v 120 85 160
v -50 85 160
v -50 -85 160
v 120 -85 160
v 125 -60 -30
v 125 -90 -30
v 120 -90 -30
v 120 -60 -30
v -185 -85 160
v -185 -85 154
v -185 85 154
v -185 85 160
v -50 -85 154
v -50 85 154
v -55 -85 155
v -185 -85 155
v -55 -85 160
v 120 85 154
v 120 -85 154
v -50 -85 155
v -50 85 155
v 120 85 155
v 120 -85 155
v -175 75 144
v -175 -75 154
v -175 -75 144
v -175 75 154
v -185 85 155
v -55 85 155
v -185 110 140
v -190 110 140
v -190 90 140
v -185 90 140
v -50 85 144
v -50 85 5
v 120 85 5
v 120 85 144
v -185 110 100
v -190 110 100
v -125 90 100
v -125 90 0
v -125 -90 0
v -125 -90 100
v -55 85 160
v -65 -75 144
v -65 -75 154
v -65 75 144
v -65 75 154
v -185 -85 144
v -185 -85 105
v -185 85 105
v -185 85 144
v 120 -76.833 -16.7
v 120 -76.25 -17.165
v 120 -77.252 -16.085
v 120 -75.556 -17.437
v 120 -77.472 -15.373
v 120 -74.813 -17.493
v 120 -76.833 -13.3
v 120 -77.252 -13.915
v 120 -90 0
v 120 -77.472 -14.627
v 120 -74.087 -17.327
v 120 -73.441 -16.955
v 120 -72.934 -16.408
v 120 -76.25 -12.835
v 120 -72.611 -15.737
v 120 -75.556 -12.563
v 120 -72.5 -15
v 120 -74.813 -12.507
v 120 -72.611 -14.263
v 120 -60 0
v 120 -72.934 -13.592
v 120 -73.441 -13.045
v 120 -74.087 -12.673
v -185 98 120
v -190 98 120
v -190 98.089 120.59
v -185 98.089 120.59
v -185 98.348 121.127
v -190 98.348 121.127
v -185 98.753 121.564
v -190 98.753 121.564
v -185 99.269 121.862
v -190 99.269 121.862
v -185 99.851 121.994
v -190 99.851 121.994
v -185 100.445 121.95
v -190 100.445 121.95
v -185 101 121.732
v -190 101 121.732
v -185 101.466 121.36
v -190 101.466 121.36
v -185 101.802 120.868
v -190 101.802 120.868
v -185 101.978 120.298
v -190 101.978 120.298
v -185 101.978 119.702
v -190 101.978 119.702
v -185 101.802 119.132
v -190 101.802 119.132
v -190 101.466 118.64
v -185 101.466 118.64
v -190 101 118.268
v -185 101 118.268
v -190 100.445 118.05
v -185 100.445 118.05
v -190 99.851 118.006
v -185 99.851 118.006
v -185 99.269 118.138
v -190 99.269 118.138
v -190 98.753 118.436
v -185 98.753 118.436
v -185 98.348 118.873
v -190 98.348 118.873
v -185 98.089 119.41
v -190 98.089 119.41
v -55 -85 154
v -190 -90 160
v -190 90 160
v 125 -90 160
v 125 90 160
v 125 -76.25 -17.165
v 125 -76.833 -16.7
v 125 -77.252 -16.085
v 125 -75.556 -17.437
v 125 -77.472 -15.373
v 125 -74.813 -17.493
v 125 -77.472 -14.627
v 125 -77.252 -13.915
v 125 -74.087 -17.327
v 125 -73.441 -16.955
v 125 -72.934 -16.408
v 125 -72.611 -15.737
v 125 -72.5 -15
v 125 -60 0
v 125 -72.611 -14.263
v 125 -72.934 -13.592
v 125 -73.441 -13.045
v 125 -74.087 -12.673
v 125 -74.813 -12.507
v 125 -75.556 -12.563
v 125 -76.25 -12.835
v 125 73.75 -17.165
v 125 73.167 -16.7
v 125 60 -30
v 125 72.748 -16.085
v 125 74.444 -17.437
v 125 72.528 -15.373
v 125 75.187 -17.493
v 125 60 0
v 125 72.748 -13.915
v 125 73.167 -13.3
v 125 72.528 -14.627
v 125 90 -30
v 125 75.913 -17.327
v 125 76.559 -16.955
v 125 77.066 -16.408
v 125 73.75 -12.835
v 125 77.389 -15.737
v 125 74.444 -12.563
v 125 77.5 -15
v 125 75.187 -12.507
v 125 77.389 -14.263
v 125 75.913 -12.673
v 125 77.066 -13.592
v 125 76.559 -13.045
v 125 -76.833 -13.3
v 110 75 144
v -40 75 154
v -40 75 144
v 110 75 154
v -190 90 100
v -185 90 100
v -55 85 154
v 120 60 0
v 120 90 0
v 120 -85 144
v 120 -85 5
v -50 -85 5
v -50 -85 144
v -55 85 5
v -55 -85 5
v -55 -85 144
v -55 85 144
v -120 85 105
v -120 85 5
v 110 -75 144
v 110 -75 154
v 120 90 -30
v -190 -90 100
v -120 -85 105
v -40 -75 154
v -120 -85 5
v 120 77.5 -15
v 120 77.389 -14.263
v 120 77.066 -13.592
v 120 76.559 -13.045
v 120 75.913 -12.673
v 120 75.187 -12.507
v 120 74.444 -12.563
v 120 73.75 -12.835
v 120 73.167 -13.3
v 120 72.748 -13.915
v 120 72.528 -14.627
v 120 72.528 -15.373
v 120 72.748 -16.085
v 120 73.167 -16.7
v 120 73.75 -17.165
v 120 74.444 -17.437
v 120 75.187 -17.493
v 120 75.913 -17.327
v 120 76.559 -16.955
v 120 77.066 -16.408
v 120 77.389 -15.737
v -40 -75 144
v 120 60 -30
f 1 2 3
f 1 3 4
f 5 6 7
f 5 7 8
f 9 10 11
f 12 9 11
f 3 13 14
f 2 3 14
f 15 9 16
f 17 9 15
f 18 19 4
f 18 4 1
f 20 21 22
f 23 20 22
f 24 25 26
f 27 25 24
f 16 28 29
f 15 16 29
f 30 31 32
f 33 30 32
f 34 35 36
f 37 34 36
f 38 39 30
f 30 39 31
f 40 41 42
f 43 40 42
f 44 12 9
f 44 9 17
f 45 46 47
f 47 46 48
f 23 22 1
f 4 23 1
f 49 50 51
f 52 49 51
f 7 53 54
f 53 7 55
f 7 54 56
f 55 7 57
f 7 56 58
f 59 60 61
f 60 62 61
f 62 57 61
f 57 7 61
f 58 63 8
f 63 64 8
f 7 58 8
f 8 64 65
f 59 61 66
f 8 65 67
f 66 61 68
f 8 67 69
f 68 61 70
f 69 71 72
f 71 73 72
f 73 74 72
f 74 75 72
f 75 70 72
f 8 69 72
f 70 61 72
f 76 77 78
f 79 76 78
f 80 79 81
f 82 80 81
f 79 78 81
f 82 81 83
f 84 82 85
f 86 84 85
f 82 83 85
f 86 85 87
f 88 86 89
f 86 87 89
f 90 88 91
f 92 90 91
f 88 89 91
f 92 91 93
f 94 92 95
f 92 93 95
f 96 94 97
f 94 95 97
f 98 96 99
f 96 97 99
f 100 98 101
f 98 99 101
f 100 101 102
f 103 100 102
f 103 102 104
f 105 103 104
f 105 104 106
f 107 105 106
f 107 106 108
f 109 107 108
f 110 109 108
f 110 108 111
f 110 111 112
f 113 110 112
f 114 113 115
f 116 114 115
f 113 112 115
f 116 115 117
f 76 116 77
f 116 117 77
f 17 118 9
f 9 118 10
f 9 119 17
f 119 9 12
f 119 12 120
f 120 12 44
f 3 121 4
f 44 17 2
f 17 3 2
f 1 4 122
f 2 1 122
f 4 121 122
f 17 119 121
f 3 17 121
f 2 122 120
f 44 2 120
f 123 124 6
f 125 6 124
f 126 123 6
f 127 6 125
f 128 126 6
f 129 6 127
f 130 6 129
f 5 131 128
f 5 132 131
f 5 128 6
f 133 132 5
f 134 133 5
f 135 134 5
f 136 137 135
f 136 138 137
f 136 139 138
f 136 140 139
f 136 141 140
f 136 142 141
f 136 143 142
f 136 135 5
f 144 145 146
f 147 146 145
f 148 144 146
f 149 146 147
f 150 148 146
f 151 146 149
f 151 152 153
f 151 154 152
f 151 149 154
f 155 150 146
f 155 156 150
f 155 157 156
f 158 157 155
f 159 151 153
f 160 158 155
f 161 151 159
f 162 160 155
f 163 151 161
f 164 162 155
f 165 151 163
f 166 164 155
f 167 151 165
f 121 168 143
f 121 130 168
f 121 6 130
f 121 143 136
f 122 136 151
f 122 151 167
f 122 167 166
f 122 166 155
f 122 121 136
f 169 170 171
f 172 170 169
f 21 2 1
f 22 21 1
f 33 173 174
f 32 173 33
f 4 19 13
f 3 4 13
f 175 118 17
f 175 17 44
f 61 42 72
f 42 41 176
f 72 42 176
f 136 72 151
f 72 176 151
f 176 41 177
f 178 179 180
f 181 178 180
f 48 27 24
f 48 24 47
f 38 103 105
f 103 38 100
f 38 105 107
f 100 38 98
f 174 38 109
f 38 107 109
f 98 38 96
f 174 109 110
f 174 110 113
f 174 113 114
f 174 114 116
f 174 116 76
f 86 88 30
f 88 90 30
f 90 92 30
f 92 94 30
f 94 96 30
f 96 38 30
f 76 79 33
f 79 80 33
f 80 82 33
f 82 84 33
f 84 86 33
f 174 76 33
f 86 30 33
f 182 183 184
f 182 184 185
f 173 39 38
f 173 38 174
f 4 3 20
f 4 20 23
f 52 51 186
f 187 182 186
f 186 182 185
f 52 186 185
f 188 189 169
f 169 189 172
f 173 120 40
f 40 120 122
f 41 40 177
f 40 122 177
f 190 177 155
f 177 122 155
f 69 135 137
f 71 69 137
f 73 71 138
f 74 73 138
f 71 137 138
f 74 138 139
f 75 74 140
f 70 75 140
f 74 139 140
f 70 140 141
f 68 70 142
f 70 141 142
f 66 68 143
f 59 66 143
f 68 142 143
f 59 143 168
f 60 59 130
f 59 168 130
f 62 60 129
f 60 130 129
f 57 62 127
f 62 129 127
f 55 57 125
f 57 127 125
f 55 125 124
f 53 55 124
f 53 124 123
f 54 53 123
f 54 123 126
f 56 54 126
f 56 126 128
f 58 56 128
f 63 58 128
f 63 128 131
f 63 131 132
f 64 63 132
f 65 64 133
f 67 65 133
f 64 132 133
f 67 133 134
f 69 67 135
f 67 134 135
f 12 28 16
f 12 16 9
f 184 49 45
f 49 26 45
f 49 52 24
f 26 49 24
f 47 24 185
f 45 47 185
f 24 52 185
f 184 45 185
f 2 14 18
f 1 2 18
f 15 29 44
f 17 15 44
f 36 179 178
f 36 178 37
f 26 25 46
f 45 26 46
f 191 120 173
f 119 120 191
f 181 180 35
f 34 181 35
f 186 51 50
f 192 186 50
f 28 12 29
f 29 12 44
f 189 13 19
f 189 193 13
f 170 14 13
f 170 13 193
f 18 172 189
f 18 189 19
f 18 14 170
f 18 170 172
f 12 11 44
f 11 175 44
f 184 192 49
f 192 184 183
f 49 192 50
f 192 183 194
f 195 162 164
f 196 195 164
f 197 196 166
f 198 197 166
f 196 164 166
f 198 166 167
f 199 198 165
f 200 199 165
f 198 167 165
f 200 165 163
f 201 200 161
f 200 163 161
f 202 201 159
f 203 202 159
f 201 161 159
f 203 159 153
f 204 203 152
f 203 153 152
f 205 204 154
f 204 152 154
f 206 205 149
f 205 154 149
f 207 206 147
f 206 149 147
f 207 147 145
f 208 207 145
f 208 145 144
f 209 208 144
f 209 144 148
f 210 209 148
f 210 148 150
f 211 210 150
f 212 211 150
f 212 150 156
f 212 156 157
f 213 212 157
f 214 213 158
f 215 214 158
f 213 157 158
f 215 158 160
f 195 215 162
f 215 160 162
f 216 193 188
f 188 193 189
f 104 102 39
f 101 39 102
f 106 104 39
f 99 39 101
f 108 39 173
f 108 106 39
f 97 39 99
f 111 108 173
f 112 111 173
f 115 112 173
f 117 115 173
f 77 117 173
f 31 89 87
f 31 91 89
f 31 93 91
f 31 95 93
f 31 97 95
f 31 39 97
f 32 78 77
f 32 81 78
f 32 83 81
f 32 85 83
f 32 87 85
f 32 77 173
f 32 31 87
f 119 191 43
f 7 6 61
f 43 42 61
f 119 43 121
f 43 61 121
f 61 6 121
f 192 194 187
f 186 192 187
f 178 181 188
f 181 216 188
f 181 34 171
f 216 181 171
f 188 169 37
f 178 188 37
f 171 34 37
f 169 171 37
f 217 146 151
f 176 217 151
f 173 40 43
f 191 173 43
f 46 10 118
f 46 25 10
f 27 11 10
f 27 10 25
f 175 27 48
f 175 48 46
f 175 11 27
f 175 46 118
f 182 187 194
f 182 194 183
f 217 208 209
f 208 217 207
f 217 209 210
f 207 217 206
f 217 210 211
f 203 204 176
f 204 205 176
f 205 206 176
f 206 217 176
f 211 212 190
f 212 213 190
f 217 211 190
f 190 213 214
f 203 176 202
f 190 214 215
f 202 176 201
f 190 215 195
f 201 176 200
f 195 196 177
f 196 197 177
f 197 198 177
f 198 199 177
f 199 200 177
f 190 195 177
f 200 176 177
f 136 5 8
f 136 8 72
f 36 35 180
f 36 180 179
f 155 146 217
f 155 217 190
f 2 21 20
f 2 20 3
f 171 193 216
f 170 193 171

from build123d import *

# Parameters (mm, degrees)
F0_W      = 5
F0_H      = 5
F0_H_2    = 170
F1_DEPTH  = 160
F0_W_2    = 65
F0_W_3    = 170
F2_DEPTH  = 5
F3_W      = 5
F3_H      = 50
F3_W_2    = 170
F4_DEPTH  = 65
F5_DEPTH  = 60
F6_DEPTH  = 6
F7_DEPTH  = 65
F8_W      = 20
F8_H      = 40
F8_R      = 2
F9_DEPTH  = 5
F10_W     = 30
F10_H     = 30
F10_R     = 2.5
F11_DEPTH = 5
F12_W     = 170
F12_H     = 10
F13_DEPTH = 170
F14_W     = 150
F14_H     = 150
F15_DEPTH = 11
F16_W     = 130
F16_H     = 10
F17_DEPTH = 170
F18_W     = 110
F18_H     = 150
F19_DEPTH = 11
F20_W     = 170
F20_H     = 5
F21_DEPTH = 170
F22_W     = 130
F22_H     = 5
F23_DEPTH = 170


with BuildPart() as f1:
    # F0 (on Top) → F1 (new body)
    with BuildSketch(Plane.XY):
        Polygon((-50, -90), (125, -90), (125, -85), (120, -85), (-50, -85), align=None)
        with Locations((-52.5, -87.5)):
            Rectangle(F0_W, F0_H)
        with Locations((122.5, 0)):
            Rectangle(F0_W, F0_H_2)
        Polygon((-125, -90), (-55, -90), (-55, -85), (-120, -85), (-125, -85), align=None)
        Polygon((120, 85), (125, 85), (125, 90), (-50, 90), (-50, 85), align=None)
        with Locations((-52.5, 87.5)):
            Rectangle(F0_W, F0_H)
        with Locations((-122.5, 0)):
            Rectangle(F0_W, F0_H_2)
        Polygon((-120, 85), (-55, 85), (-55, 90), (-125, 90), (-125, 85), align=None)
        with Locations((-52.5, 0)):
            Rectangle(F0_W, F0_H_2)
    extrude(amount=F1_DEPTH)

    # F0 (on Top) → F2 (join)
    with BuildSketch(Plane.XY):
        with Locations((-87.5, 0)):
            Rectangle(F0_W_2, F0_H_2)
        with Locations((35, 0)):
            Rectangle(F0_W_3, F0_H_2)
    extrude(amount=F2_DEPTH)

    # F3 (on face) → F4 (join)
    with BuildSketch(Plane(origin=(-125, 0, 0), x_dir=(0, -1, 0), z_dir=(-1, 0, 0))):
        Polygon((90, 160), (-90, 160), (-90, 155), (-85, 155), (85, 155), (90, 155), align=None)
        with Locations((-87.5, 130)):
            Rectangle(F3_W, F3_H)
        with Locations((87.5, 130)):
            Rectangle(F3_W, F3_H)
        Polygon((-85, 105), (-90, 105), (-90, 100), (90, 100), (90, 105), (85, 105), align=None)
        with Locations((0, 130)):
            Rectangle(F3_W_2, F3_H)
    extrude(amount=F4_DEPTH)

    # F3 (on face) → F5 (cut)
    with BuildSketch(Plane(origin=(-125, 0, 0), x_dir=(0, -1, 0), z_dir=(-1, 0, 0))):
        with Locations((0, 130)):
            Rectangle(F3_W_2, F3_H)
    extrude(amount=F5_DEPTH, mode=Mode.SUBTRACT)

    # F3 (on face) → F6 (cut)
    with BuildSketch(Plane(origin=(-125, 0, 0), x_dir=(0, -1, 0), z_dir=(-1, 0, 0))):
        with Locations((0, 130)):
            Rectangle(F3_W_2, F3_H)
    extrude(amount=-F6_DEPTH, mode=Mode.SUBTRACT)

    # F7 (cut): a face of the model
    f7_faces = [f1.faces().sort_by_distance(p)[0] for p in [
        (-120, 0, 157.5),
    ]]
    extrude(f7_faces, amount=-F7_DEPTH, mode=Mode.SUBTRACT)

    # F10 (on face) → F11 (join)
    with BuildSketch(Plane.YZ.offset(125)):
        with Locations((-75, -15)):
            Rectangle(F10_W, F10_H)
        with Locations((-75, -15)):
            Circle(F10_R, mode=Mode.SUBTRACT)
        with Locations((75, -15)):
            Rectangle(F10_W, F10_H)
        with Locations((75, -15)):
            Circle(F10_R, mode=Mode.SUBTRACT)
    extrude(amount=-F11_DEPTH)

    # F12 (on face) → F13 (join)
    with BuildSketch(Plane.XZ.offset(-85)):
        with Locations((35, 149)):
            Rectangle(F12_W, F12_H)
    extrude(amount=F13_DEPTH)

    # F14 (on face) → F15 (cut)
    with BuildSketch(Plane.XY.offset(154)):
        with Locations((35, 0)):
            Rectangle(F14_W, F14_H)
    extrude(amount=-F15_DEPTH, mode=Mode.SUBTRACT)

    # F16 (on face) → F17 (join)
    with BuildSketch(Plane.XZ.offset(-85)):
        with Locations((-120, 149)):
            Rectangle(F16_W, F16_H)
    extrude(amount=F17_DEPTH)

    # F18 (on face) → F19 (cut)
    with BuildSketch(Plane.XY.offset(154)):
        with Locations((-120, 0)):
            Rectangle(F18_W, F18_H)
    extrude(amount=-F19_DEPTH, mode=Mode.SUBTRACT)


with BuildPart() as f9:
    # F8 (on face) → F9 (new body)
    with BuildSketch(Plane(origin=(-190, 0, 0), x_dir=(0, -1, 0), z_dir=(-1, 0, 0))):
        with Locations((-100, 120)):
            Rectangle(F8_W, F8_H)
        with Locations((-100, 120)):
            Circle(F8_R, mode=Mode.SUBTRACT)
    extrude(amount=-F9_DEPTH)


with BuildPart() as f21:
    # F20 (on face) → F21 (new body)
    with BuildSketch(Plane.XZ.offset(-85)):
        with Locations((35, 157.5)):
            Rectangle(F20_W, F20_H)
    extrude(amount=F21_DEPTH)


with BuildPart() as f23:
    # F22 (on face) → F23 (new body)
    with BuildSketch(Plane.XZ.offset(-85)):
        with Locations((-120, 157.5)):
            Rectangle(F22_W, F22_H)
    extrude(amount=F23_DEPTH)


solid = Compound([f1.part, f9.part, f21.part, f23.part])
